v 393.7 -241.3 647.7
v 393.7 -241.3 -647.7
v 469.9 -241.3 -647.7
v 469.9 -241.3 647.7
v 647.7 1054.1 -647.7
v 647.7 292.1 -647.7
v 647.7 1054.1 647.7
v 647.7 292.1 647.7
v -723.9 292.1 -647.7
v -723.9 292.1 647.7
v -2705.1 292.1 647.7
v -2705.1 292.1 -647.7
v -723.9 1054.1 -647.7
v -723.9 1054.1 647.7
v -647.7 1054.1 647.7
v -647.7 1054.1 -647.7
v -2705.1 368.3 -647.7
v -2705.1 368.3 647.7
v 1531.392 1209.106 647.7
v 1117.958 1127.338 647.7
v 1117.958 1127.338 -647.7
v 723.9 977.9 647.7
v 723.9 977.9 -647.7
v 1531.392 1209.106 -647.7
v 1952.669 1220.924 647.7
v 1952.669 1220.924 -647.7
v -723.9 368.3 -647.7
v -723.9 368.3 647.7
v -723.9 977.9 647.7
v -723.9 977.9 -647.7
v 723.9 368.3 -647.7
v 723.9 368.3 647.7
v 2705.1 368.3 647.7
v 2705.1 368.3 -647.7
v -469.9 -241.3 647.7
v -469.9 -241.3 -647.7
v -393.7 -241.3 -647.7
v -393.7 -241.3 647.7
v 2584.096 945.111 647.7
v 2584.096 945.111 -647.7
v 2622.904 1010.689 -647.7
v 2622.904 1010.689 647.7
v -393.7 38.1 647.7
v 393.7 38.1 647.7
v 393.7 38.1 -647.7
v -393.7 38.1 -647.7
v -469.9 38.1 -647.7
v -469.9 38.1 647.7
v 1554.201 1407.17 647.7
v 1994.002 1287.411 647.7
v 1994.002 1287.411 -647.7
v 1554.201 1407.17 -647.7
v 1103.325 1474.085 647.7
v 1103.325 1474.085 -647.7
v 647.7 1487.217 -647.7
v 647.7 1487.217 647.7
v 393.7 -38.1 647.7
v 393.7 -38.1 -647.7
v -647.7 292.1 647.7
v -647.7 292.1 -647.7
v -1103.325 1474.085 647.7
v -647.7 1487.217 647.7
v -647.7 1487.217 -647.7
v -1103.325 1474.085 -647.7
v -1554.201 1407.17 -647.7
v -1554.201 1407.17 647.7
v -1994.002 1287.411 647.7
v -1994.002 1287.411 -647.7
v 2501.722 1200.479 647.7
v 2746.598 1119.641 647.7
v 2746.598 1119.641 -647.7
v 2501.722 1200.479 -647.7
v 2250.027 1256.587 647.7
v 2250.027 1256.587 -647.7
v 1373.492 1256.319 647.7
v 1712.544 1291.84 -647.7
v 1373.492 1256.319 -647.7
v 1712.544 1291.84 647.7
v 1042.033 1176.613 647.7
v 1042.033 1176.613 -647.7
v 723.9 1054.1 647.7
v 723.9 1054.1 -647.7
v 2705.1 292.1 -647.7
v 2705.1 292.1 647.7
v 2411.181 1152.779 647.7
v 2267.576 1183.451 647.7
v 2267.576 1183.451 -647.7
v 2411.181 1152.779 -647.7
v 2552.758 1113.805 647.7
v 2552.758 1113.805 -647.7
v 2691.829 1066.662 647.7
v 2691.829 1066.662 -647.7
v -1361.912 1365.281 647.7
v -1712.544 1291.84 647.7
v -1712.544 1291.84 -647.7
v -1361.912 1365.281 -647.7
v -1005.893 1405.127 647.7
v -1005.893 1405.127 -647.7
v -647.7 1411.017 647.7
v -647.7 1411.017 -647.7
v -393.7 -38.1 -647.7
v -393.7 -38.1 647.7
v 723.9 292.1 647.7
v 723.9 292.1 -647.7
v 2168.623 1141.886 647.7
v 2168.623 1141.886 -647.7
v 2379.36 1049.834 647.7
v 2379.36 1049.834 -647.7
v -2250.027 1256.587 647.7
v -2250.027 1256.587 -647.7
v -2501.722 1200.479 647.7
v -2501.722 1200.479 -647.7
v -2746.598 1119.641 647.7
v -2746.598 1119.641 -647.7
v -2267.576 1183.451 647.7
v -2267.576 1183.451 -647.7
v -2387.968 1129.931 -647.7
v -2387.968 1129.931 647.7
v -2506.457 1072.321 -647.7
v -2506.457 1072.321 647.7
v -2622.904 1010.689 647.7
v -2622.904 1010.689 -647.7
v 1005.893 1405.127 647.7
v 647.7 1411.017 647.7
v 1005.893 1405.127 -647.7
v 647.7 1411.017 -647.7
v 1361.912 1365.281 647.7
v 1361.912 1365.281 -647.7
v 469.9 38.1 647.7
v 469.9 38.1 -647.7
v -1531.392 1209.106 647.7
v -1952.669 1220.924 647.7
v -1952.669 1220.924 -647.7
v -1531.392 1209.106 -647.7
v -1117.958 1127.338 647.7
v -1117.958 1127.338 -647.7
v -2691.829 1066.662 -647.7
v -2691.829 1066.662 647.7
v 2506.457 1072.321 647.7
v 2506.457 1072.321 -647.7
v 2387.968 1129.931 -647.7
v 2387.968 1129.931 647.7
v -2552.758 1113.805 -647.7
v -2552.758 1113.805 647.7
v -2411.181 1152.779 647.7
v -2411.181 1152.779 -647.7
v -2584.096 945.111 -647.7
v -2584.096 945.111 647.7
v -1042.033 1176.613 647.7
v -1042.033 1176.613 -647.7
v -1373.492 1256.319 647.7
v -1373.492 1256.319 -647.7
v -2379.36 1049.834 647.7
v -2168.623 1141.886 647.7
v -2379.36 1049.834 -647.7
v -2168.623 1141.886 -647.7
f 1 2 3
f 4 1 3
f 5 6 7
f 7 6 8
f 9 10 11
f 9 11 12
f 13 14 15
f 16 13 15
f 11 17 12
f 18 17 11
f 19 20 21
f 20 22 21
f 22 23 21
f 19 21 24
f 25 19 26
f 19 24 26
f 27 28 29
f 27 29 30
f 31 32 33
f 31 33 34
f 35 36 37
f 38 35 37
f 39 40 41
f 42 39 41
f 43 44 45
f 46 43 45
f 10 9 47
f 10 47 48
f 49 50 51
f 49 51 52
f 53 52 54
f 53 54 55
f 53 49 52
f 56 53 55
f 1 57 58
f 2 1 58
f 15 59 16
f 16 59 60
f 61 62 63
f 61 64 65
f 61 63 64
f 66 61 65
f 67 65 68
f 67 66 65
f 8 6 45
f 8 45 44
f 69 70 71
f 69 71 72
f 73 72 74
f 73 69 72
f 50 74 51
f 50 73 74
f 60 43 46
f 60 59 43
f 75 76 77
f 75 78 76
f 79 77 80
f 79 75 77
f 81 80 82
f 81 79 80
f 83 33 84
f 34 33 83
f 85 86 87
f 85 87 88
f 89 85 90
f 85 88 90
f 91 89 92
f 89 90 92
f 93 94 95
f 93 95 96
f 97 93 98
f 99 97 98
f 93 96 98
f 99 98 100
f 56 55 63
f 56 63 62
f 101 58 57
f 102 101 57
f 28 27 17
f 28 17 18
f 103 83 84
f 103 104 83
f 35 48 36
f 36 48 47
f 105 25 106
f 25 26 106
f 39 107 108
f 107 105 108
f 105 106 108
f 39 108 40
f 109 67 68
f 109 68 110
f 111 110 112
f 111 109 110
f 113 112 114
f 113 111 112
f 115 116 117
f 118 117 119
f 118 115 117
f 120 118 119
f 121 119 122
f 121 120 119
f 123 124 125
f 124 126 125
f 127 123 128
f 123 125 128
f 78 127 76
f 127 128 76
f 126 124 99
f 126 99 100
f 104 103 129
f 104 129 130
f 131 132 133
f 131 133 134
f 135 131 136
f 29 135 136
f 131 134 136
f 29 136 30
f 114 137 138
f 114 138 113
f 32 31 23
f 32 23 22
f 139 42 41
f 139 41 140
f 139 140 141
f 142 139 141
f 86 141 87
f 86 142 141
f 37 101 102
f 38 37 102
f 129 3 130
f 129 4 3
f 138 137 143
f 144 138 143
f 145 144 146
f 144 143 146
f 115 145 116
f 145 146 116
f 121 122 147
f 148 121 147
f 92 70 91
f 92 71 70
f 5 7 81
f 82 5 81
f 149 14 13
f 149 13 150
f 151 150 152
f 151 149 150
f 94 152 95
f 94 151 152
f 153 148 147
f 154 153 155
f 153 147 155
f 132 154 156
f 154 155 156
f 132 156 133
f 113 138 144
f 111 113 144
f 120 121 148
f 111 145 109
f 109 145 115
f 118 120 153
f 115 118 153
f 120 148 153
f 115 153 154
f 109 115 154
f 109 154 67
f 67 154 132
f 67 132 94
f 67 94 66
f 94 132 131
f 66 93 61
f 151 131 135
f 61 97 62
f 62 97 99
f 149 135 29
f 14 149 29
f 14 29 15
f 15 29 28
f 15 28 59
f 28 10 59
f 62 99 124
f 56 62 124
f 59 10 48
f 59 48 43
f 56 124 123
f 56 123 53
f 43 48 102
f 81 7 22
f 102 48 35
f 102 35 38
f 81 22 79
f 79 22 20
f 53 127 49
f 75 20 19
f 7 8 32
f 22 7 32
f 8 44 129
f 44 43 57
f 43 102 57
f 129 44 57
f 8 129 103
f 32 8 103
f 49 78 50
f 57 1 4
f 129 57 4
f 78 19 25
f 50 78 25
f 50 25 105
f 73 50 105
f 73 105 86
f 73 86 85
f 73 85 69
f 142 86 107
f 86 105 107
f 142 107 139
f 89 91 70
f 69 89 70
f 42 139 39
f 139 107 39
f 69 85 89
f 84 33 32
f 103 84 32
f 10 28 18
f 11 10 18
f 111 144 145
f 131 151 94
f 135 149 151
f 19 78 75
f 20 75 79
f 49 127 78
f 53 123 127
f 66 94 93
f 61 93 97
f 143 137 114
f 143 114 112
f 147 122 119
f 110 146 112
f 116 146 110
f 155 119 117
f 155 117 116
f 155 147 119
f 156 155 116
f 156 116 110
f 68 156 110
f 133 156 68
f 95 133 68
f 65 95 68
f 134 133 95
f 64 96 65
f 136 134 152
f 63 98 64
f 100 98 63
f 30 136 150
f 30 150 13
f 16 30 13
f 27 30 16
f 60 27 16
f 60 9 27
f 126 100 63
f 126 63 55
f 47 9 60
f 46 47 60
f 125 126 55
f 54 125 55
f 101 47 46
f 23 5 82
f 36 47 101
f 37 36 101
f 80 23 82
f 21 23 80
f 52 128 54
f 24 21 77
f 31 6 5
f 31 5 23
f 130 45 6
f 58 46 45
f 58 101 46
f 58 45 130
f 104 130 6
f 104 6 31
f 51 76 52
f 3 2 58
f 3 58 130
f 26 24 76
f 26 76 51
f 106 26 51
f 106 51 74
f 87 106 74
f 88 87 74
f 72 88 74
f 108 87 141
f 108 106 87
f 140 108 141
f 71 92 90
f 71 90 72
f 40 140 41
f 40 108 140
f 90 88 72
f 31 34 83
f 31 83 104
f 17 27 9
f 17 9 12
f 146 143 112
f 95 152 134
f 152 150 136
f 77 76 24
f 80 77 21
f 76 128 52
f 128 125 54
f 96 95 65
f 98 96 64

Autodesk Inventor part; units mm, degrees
ref_plane "YZ Plane" through (0, 0, 0) normal (1, 0, 0) x (0, 1, 0)
ref_plane "XZ Plane" through (0, 0, 0) normal (0, 1, 0) x (-1, 0, 0)
ref_plane "XY Plane" through (0, 0, 0) normal (0, 0, 1) x (1, 0, 0)
sketch "Sketch1" plane through (0, 0, 0) normal (1, 0, 0) x (0, 1, 0)
  line L0 (38.1, 647.7) -> (-38.1, 647.7)
  line L1 (-38.1, 647.7) -> (-38.1, -647.7)
  line L2 (-38.1, -647.7) -> (38.1, -647.7)
  line L3 (38.1, -647.7) -> (38.1, 647.7)
  line L4 (0, 0) -> (420.0175, 0) construction
  point P0 (0, 647.7)
  dimension "d0" = 76.2
  dimension "d1" = 1295.4
  dimension "d2" = 647.7
extrude "Extrusion1" add sketch "Sketch1" along normal blind 469.9
sketch "Sketch2" plane through (0, -38.1, -647.7) normal (0, -1, 0) x (1, 0, 0)
  line L0 (0, 0) -> (469.9, 0) projected
  line L1 (469.9, 1295.4) -> (393.7, 1295.4)
  line L2 (393.7, 1295.4) -> (393.7, 0)
  line L3 (393.7, 0) -> (469.9, 0)
  line L4 (469.9, 0) -> (469.9, 1295.4)
  point P0 (0, 647.7)
  dimension "d5" = 76.2
extrude "Extrusion2" add sketch "Sketch2" along normal blind 203.2
sketch "Sketch3" plane through (0, 38.1, 647.7) normal (0, 1, 0) x (1, 0, 0)
  line L0 (469.9, 1295.4) -> (469.9, 0) projected
  line L1 (393.7, 0) -> (393.7, 1295.4) projected
  line L2 (469.9, 1295.4) -> (393.7, 1295.4)
  line L3 (393.7, 1295.4) -> (393.7, 0)
  line L4 (393.7, 0) -> (469.9, 0)
  line L5 (469.9, 0) -> (469.9, 1295.4)
  point P0 (0, 647.7)
sketch "Sketch4" plane through (0, 0, 0) normal (0, 0, 1) x (1, 0, 0)
  line L0 (0, 38.1) -> (469.9, 38.1) projected
  line L1 (431.8, 38.1) -> (685.8, 292.1)
  point P0 (0, 0)
  dimension "d10" = 135
  dimension "d11" = 38.1
  dimension "d12" = 254
sweep "Sweep1" add profiles "Sketch3" path "Sketch4" path curves L1
sketch "Sketch5" plane through (647.7, 292.1, -647.7) normal (0, 1, 0) x (1, 0, 0)
  line L0 (76.2, -1295.4) -> (76.2, 0) projected
  line L1 (-254, -1295.4) -> (0, -1295.4) projected
  line L2 (76.2, 0) -> (0, 0)
  line L3 (0, 0) -> (0, -1295.4)
  line L4 (0, -1295.4) -> (76.2, -1295.4)
  line L5 (76.2, -1295.4) -> (76.2, 0)
  point P0 (-647.7, -647.7)
extrude "Extrusion3" add sketch "Sketch5" along normal blind 76.2
sketch "Sketch6" plane through (723.9, 292.1, -647.7) normal (1, 0, 0) x (0, 0, -1)
  line L0 (-1295.4, 0) -> (-1295.4, 76.2) projected
  line L1 (0, -254) -> (0, 0) projected
  line L2 (-1295.4, 76.2) -> (0, 76.2)
  line L3 (0, 76.2) -> (0, 0)
  line L4 (0, 0) -> (-1295.4, 0)
  line L5 (-1295.4, 0) -> (-1295.4, 76.2)
  point P0 (-647.7, -292.1)
extrude "Extrusion4" add sketch "Sketch6" along normal blind 1981.2
sketch "Sketch7" plane through (647.7, 368.3, -647.7) normal (0, 1, 0) x (1, 0, 0)
  line L0 (0, 0) -> (0, -1295.4) projected
  line L1 (0, 0) -> (76.2, 0)
  line L2 (76.2, 0) -> (76.2, -1295.4)
  line L3 (76.2, -1295.4) -> (0, -1295.4)
  line L4 (0, -1295.4) -> (0, 0)
  point P0 (-647.7, -647.7)
  dimension "d19" = 76.2
extrude "Extrusion5" add sketch "Sketch7" along normal blind 609.6
sketch "Sketch8" plane through (0, 0, 0) normal (0, 0, 1) x (1, 0, 0)
  line L0 (647.7, 977.9) -> (723.9, 977.9) projected
  arc A0 (2705.1, 1079.5) -> (685.8, 977.9) centre (1812.5424, -1298.512) ccw
  line L1 (723.9, 977.9) -> (2746.3916, 977.9) construction
  line L2 (723.9, 368.3) -> (2705.1, 368.3) construction
  line L3 (2705.1, 368.3) -> (2705.1, 1575.1367) construction
  point P0 (0, 0)
  dimension "d22" = 2540
  dimension "d23" = 101.6
sketch "Sketch9" plane through (647.7, 977.9, -647.7) normal (0, 1, 0) x (1, 0, 0)
  line L0 (0, 0) -> (0, -1295.4) projected
  line L1 (-177.8, -1295.4) -> (76.2, -1295.4) projected
  line L2 (0, 0) -> (76.2, 0)
  line L3 (76.2, 0) -> (76.2, -1295.4)
  line L4 (76.2, -1295.4) -> (0, -1295.4)
  line L5 (0, -1295.4) -> (0, 0)
  point P0 (-647.7, -647.7)
sketch "Sketch12" plane through (0, 0, 0) normal (1, 0, 0) x (0, 1, 0)
  line L0 (1487.2171, -647.7) -> (1411.0171, -647.7)
  line L1 (1411.0171, -647.7) -> (1411.0171, 647.7)
  line L2 (1411.0171, 647.7) -> (1487.2171, 647.7)
  line L3 (1487.2171, 647.7) -> (1487.2171, -647.7)
  line L4 (876.3, -647.7) -> (1157.0171, -647.7) construction
  line L5 (876.3, 647.7) -> (1157.0171, 647.7) construction
  line L6 (1157.0171, -647.7) -> (1157.0171, 647.7) construction
  point P0 (0, 0)
  point P1 (1005.7223, -647.7)
  point P2 (1005.7223, 647.7)
  dimension "d26" = 1295.4
  dimension "d27" = 76.2
  dimension "d28" = 254
  dimension "d29" = 647.7
extrude "Extrusion6" add sketch "Sketch12" along normal blind 647.7
sketch "Sketch13" plane through (0, 0, 0) normal (0, 0, 1) x (1, 0, 0)
  line L0 (2577.4706, 1005.7223) -> (2629.5294, 950.0777) projected
  line L1 (647.7, 1411.0171) -> (647.7, 1487.2171) projected
  arc A0 (2603.5, 977.9) -> (647.7, 1449.1171) centre (764.8444, -2359.0815) ccw
  point P0 (0, 0)
  dimension "d32" = 3810
ref_plane "Work Plane2" through (2577.4706, 1005.7223, 647.7) normal (0.7302, 0.6832, 0) x (0, 0, -1)
sketch "Sketch14" plane through (2577.4706, 1005.7223, 647.7) normal (0.7302, 0.6832, 0) x (0, 0, -1)
  line L0 (0, -76.2) -> (0, 1241.2384) projected
  line L1 (0, -76.2) -> (1295.4, -76.2) projected
  line L2 (0, -0.6753) -> (1295.4, -0.6753)
  line L3 (1295.4, -0.6753) -> (1295.4, -76.2)
  line L4 (1295.4, -76.2) -> (0, -76.2)
  line L5 (0, -76.2) -> (0, -0.6753)
  point P0 (647.7, 1026.474)
sketch "Sketch15" plane through (647.7, 0, 0) normal (1, 0, 0) x (0, 0, -1)
  line L0 (647.7, 1487.2171) -> (-647.7, 1487.2171) projected
  line L1 (647.7, 1411.0171) -> (647.7, 1487.2171) projected
  line L2 (-647.7, 1487.2171) -> (647.7, 1487.2171)
  line L3 (647.7, 1487.2171) -> (647.7, 1411.0171)
  line L4 (647.7, 1411.0171) -> (-647.7, 1411.0171)
  line L5 (-647.7, 1411.0171) -> (-647.7, 1487.2171)
  point P0 (0, 0)
sweep "Sweep3" add profiles "Sketch15" path "Sketch13" path curves A0
extrude "Extrusion7" add sketch "Sketch9" along normal blind 76.2
sketch "Sketch16" plane through (723.9, 368.3, 647.7) normal (1, 0, 0) x (0, 0, -1)
  line L0 (0, 0) -> (0, 685.8) projected
  line L1 (1295.4, 0) -> (1295.4, 685.8) projected
  line L2 (0, 685.8) -> (1295.4, 685.8)
  line L3 (1295.4, 685.8) -> (1295.4, 609.6)
  line L4 (1295.4, 609.6) -> (0, 609.6)
  line L5 (0, 609.6) -> (0, 685.8)
  point P0 (647.7, -368.3)
  dimension "d37" = 76.2
sweep "Sweep4" add profiles "Sketch16" path "Sketch8" path curves A0
mirror "Mirror1" about plane through (0, 0, 0) normal (1, 0, 0) of "Extrusion1", "Extrusion2", "Sweep1", "Extrusion3", "Extrusion4", "Extrusion5", "Extrusion6", "Sweep3", "Extrusion7", "Sweep4"
properties part number "Test"
